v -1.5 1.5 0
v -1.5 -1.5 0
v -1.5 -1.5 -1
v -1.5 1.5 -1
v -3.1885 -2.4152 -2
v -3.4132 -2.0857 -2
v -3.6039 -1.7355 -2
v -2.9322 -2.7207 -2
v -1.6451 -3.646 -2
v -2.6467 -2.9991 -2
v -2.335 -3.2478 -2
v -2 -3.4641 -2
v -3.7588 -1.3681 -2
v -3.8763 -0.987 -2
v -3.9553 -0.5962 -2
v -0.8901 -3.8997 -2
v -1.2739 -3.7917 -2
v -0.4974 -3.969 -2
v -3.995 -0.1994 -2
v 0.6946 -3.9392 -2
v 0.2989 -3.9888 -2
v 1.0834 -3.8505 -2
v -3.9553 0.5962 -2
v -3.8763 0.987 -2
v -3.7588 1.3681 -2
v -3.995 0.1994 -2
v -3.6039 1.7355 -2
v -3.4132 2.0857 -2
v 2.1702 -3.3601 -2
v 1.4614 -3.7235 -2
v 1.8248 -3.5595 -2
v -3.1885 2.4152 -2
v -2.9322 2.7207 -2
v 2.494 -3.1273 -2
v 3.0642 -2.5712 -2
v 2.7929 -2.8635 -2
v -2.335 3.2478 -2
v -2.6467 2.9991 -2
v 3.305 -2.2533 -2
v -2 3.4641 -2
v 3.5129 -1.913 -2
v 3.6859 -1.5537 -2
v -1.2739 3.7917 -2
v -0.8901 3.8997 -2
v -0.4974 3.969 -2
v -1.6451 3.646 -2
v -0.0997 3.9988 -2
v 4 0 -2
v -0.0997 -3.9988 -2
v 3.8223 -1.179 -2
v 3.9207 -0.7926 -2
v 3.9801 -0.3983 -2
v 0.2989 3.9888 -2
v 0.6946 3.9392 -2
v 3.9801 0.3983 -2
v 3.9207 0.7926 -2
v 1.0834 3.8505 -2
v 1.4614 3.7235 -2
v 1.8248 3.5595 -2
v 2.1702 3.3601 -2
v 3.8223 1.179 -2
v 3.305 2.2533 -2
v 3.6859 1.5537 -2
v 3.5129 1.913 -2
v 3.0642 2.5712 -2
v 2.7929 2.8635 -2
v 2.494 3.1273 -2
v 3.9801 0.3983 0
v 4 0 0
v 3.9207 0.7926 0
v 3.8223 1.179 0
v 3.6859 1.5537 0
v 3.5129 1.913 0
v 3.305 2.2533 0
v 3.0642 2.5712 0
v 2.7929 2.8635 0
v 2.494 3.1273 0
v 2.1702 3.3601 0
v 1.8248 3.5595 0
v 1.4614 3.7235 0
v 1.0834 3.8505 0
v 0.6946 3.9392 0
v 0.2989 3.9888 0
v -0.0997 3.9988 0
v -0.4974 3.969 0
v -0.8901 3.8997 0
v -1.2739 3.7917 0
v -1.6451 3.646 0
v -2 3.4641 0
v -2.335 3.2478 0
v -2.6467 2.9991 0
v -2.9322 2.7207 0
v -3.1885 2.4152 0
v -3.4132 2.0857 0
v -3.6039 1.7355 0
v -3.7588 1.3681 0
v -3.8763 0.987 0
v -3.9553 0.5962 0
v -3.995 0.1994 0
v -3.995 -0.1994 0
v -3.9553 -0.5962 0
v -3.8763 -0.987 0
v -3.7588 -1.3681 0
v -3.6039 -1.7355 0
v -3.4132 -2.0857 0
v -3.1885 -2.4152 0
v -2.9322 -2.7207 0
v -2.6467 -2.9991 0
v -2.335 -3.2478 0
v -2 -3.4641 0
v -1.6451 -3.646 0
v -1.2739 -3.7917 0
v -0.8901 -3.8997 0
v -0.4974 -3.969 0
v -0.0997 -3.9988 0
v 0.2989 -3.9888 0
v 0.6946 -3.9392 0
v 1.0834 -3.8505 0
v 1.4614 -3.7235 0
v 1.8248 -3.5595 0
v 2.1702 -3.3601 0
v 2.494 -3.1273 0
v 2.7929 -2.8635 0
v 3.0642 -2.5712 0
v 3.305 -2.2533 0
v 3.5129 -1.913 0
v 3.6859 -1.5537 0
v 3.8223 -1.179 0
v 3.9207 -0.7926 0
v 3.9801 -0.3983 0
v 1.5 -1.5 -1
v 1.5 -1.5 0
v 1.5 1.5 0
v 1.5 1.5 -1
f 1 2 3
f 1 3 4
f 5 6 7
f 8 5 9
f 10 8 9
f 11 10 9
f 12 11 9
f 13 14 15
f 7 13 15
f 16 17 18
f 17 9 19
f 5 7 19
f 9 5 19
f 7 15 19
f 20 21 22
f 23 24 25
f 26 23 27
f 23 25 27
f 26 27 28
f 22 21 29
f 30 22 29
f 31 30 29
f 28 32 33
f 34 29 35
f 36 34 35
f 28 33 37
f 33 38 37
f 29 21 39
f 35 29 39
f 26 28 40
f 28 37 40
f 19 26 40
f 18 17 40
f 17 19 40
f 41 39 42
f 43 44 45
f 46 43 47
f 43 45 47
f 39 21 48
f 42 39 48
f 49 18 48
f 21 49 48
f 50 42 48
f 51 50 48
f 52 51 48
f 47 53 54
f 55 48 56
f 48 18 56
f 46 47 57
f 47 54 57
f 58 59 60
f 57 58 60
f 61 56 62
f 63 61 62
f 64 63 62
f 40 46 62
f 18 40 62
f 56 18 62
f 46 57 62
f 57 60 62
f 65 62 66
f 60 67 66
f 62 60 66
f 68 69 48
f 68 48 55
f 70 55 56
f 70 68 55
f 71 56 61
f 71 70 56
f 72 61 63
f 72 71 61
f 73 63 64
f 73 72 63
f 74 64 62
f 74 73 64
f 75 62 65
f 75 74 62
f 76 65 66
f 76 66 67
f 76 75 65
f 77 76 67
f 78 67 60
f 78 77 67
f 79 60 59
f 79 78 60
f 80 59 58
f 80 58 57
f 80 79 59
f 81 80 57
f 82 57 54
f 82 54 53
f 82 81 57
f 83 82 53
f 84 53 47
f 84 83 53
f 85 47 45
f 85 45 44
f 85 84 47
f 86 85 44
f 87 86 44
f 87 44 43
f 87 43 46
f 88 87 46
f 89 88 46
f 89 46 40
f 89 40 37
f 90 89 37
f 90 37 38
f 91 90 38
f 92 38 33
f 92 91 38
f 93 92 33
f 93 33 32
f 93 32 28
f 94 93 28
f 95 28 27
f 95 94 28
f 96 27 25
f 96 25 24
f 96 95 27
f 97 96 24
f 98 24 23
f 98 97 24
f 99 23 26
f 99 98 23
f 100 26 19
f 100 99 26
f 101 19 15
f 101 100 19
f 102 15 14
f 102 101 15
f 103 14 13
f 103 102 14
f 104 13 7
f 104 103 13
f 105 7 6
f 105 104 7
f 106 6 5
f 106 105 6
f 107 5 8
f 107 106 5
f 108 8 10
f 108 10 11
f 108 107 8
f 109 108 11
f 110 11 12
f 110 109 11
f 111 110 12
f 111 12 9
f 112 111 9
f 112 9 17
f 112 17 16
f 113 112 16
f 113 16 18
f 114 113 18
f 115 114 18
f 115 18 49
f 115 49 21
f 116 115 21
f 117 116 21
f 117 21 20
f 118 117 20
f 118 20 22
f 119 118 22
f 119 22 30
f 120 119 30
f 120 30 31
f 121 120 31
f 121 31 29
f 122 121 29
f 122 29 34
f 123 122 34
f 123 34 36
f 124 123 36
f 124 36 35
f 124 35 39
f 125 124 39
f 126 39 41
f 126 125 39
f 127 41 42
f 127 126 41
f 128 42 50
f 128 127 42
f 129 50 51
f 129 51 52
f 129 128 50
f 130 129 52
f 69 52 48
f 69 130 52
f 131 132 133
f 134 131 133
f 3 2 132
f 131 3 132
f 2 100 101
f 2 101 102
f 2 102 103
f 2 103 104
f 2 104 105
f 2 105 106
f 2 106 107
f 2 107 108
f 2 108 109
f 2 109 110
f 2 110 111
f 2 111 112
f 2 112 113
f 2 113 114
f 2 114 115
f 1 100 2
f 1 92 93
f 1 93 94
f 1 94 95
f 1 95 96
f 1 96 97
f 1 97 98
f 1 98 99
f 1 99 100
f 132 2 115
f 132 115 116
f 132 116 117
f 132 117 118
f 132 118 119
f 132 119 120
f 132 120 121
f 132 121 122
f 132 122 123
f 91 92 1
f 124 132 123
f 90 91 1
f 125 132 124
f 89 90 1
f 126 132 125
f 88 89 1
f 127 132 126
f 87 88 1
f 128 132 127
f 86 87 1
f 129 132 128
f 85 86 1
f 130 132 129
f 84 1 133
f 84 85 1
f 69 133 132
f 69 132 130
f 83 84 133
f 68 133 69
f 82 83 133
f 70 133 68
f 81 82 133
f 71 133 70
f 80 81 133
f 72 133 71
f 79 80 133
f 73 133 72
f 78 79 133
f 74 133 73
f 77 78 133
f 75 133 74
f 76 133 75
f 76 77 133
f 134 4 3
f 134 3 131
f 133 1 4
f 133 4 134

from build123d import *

# Parameters (mm, degrees)
F0_R     = 4
F1_DEPTH = 2
F2_W     = 3
F2_H     = 3
F3_DEPTH = 1


with BuildPart() as f1:
    # F0 (on Top) → F1 (new body)
    with BuildSketch(Plane.XY):
        Circle(F0_R)
    extrude(amount=-F1_DEPTH)

    # F2 (on face) → F3 (cut)
    with BuildSketch(Plane.XY):
        Rectangle(F2_W, F2_H)
    extrude(amount=-F3_DEPTH, mode=Mode.SUBTRACT)


solid = f1.part
